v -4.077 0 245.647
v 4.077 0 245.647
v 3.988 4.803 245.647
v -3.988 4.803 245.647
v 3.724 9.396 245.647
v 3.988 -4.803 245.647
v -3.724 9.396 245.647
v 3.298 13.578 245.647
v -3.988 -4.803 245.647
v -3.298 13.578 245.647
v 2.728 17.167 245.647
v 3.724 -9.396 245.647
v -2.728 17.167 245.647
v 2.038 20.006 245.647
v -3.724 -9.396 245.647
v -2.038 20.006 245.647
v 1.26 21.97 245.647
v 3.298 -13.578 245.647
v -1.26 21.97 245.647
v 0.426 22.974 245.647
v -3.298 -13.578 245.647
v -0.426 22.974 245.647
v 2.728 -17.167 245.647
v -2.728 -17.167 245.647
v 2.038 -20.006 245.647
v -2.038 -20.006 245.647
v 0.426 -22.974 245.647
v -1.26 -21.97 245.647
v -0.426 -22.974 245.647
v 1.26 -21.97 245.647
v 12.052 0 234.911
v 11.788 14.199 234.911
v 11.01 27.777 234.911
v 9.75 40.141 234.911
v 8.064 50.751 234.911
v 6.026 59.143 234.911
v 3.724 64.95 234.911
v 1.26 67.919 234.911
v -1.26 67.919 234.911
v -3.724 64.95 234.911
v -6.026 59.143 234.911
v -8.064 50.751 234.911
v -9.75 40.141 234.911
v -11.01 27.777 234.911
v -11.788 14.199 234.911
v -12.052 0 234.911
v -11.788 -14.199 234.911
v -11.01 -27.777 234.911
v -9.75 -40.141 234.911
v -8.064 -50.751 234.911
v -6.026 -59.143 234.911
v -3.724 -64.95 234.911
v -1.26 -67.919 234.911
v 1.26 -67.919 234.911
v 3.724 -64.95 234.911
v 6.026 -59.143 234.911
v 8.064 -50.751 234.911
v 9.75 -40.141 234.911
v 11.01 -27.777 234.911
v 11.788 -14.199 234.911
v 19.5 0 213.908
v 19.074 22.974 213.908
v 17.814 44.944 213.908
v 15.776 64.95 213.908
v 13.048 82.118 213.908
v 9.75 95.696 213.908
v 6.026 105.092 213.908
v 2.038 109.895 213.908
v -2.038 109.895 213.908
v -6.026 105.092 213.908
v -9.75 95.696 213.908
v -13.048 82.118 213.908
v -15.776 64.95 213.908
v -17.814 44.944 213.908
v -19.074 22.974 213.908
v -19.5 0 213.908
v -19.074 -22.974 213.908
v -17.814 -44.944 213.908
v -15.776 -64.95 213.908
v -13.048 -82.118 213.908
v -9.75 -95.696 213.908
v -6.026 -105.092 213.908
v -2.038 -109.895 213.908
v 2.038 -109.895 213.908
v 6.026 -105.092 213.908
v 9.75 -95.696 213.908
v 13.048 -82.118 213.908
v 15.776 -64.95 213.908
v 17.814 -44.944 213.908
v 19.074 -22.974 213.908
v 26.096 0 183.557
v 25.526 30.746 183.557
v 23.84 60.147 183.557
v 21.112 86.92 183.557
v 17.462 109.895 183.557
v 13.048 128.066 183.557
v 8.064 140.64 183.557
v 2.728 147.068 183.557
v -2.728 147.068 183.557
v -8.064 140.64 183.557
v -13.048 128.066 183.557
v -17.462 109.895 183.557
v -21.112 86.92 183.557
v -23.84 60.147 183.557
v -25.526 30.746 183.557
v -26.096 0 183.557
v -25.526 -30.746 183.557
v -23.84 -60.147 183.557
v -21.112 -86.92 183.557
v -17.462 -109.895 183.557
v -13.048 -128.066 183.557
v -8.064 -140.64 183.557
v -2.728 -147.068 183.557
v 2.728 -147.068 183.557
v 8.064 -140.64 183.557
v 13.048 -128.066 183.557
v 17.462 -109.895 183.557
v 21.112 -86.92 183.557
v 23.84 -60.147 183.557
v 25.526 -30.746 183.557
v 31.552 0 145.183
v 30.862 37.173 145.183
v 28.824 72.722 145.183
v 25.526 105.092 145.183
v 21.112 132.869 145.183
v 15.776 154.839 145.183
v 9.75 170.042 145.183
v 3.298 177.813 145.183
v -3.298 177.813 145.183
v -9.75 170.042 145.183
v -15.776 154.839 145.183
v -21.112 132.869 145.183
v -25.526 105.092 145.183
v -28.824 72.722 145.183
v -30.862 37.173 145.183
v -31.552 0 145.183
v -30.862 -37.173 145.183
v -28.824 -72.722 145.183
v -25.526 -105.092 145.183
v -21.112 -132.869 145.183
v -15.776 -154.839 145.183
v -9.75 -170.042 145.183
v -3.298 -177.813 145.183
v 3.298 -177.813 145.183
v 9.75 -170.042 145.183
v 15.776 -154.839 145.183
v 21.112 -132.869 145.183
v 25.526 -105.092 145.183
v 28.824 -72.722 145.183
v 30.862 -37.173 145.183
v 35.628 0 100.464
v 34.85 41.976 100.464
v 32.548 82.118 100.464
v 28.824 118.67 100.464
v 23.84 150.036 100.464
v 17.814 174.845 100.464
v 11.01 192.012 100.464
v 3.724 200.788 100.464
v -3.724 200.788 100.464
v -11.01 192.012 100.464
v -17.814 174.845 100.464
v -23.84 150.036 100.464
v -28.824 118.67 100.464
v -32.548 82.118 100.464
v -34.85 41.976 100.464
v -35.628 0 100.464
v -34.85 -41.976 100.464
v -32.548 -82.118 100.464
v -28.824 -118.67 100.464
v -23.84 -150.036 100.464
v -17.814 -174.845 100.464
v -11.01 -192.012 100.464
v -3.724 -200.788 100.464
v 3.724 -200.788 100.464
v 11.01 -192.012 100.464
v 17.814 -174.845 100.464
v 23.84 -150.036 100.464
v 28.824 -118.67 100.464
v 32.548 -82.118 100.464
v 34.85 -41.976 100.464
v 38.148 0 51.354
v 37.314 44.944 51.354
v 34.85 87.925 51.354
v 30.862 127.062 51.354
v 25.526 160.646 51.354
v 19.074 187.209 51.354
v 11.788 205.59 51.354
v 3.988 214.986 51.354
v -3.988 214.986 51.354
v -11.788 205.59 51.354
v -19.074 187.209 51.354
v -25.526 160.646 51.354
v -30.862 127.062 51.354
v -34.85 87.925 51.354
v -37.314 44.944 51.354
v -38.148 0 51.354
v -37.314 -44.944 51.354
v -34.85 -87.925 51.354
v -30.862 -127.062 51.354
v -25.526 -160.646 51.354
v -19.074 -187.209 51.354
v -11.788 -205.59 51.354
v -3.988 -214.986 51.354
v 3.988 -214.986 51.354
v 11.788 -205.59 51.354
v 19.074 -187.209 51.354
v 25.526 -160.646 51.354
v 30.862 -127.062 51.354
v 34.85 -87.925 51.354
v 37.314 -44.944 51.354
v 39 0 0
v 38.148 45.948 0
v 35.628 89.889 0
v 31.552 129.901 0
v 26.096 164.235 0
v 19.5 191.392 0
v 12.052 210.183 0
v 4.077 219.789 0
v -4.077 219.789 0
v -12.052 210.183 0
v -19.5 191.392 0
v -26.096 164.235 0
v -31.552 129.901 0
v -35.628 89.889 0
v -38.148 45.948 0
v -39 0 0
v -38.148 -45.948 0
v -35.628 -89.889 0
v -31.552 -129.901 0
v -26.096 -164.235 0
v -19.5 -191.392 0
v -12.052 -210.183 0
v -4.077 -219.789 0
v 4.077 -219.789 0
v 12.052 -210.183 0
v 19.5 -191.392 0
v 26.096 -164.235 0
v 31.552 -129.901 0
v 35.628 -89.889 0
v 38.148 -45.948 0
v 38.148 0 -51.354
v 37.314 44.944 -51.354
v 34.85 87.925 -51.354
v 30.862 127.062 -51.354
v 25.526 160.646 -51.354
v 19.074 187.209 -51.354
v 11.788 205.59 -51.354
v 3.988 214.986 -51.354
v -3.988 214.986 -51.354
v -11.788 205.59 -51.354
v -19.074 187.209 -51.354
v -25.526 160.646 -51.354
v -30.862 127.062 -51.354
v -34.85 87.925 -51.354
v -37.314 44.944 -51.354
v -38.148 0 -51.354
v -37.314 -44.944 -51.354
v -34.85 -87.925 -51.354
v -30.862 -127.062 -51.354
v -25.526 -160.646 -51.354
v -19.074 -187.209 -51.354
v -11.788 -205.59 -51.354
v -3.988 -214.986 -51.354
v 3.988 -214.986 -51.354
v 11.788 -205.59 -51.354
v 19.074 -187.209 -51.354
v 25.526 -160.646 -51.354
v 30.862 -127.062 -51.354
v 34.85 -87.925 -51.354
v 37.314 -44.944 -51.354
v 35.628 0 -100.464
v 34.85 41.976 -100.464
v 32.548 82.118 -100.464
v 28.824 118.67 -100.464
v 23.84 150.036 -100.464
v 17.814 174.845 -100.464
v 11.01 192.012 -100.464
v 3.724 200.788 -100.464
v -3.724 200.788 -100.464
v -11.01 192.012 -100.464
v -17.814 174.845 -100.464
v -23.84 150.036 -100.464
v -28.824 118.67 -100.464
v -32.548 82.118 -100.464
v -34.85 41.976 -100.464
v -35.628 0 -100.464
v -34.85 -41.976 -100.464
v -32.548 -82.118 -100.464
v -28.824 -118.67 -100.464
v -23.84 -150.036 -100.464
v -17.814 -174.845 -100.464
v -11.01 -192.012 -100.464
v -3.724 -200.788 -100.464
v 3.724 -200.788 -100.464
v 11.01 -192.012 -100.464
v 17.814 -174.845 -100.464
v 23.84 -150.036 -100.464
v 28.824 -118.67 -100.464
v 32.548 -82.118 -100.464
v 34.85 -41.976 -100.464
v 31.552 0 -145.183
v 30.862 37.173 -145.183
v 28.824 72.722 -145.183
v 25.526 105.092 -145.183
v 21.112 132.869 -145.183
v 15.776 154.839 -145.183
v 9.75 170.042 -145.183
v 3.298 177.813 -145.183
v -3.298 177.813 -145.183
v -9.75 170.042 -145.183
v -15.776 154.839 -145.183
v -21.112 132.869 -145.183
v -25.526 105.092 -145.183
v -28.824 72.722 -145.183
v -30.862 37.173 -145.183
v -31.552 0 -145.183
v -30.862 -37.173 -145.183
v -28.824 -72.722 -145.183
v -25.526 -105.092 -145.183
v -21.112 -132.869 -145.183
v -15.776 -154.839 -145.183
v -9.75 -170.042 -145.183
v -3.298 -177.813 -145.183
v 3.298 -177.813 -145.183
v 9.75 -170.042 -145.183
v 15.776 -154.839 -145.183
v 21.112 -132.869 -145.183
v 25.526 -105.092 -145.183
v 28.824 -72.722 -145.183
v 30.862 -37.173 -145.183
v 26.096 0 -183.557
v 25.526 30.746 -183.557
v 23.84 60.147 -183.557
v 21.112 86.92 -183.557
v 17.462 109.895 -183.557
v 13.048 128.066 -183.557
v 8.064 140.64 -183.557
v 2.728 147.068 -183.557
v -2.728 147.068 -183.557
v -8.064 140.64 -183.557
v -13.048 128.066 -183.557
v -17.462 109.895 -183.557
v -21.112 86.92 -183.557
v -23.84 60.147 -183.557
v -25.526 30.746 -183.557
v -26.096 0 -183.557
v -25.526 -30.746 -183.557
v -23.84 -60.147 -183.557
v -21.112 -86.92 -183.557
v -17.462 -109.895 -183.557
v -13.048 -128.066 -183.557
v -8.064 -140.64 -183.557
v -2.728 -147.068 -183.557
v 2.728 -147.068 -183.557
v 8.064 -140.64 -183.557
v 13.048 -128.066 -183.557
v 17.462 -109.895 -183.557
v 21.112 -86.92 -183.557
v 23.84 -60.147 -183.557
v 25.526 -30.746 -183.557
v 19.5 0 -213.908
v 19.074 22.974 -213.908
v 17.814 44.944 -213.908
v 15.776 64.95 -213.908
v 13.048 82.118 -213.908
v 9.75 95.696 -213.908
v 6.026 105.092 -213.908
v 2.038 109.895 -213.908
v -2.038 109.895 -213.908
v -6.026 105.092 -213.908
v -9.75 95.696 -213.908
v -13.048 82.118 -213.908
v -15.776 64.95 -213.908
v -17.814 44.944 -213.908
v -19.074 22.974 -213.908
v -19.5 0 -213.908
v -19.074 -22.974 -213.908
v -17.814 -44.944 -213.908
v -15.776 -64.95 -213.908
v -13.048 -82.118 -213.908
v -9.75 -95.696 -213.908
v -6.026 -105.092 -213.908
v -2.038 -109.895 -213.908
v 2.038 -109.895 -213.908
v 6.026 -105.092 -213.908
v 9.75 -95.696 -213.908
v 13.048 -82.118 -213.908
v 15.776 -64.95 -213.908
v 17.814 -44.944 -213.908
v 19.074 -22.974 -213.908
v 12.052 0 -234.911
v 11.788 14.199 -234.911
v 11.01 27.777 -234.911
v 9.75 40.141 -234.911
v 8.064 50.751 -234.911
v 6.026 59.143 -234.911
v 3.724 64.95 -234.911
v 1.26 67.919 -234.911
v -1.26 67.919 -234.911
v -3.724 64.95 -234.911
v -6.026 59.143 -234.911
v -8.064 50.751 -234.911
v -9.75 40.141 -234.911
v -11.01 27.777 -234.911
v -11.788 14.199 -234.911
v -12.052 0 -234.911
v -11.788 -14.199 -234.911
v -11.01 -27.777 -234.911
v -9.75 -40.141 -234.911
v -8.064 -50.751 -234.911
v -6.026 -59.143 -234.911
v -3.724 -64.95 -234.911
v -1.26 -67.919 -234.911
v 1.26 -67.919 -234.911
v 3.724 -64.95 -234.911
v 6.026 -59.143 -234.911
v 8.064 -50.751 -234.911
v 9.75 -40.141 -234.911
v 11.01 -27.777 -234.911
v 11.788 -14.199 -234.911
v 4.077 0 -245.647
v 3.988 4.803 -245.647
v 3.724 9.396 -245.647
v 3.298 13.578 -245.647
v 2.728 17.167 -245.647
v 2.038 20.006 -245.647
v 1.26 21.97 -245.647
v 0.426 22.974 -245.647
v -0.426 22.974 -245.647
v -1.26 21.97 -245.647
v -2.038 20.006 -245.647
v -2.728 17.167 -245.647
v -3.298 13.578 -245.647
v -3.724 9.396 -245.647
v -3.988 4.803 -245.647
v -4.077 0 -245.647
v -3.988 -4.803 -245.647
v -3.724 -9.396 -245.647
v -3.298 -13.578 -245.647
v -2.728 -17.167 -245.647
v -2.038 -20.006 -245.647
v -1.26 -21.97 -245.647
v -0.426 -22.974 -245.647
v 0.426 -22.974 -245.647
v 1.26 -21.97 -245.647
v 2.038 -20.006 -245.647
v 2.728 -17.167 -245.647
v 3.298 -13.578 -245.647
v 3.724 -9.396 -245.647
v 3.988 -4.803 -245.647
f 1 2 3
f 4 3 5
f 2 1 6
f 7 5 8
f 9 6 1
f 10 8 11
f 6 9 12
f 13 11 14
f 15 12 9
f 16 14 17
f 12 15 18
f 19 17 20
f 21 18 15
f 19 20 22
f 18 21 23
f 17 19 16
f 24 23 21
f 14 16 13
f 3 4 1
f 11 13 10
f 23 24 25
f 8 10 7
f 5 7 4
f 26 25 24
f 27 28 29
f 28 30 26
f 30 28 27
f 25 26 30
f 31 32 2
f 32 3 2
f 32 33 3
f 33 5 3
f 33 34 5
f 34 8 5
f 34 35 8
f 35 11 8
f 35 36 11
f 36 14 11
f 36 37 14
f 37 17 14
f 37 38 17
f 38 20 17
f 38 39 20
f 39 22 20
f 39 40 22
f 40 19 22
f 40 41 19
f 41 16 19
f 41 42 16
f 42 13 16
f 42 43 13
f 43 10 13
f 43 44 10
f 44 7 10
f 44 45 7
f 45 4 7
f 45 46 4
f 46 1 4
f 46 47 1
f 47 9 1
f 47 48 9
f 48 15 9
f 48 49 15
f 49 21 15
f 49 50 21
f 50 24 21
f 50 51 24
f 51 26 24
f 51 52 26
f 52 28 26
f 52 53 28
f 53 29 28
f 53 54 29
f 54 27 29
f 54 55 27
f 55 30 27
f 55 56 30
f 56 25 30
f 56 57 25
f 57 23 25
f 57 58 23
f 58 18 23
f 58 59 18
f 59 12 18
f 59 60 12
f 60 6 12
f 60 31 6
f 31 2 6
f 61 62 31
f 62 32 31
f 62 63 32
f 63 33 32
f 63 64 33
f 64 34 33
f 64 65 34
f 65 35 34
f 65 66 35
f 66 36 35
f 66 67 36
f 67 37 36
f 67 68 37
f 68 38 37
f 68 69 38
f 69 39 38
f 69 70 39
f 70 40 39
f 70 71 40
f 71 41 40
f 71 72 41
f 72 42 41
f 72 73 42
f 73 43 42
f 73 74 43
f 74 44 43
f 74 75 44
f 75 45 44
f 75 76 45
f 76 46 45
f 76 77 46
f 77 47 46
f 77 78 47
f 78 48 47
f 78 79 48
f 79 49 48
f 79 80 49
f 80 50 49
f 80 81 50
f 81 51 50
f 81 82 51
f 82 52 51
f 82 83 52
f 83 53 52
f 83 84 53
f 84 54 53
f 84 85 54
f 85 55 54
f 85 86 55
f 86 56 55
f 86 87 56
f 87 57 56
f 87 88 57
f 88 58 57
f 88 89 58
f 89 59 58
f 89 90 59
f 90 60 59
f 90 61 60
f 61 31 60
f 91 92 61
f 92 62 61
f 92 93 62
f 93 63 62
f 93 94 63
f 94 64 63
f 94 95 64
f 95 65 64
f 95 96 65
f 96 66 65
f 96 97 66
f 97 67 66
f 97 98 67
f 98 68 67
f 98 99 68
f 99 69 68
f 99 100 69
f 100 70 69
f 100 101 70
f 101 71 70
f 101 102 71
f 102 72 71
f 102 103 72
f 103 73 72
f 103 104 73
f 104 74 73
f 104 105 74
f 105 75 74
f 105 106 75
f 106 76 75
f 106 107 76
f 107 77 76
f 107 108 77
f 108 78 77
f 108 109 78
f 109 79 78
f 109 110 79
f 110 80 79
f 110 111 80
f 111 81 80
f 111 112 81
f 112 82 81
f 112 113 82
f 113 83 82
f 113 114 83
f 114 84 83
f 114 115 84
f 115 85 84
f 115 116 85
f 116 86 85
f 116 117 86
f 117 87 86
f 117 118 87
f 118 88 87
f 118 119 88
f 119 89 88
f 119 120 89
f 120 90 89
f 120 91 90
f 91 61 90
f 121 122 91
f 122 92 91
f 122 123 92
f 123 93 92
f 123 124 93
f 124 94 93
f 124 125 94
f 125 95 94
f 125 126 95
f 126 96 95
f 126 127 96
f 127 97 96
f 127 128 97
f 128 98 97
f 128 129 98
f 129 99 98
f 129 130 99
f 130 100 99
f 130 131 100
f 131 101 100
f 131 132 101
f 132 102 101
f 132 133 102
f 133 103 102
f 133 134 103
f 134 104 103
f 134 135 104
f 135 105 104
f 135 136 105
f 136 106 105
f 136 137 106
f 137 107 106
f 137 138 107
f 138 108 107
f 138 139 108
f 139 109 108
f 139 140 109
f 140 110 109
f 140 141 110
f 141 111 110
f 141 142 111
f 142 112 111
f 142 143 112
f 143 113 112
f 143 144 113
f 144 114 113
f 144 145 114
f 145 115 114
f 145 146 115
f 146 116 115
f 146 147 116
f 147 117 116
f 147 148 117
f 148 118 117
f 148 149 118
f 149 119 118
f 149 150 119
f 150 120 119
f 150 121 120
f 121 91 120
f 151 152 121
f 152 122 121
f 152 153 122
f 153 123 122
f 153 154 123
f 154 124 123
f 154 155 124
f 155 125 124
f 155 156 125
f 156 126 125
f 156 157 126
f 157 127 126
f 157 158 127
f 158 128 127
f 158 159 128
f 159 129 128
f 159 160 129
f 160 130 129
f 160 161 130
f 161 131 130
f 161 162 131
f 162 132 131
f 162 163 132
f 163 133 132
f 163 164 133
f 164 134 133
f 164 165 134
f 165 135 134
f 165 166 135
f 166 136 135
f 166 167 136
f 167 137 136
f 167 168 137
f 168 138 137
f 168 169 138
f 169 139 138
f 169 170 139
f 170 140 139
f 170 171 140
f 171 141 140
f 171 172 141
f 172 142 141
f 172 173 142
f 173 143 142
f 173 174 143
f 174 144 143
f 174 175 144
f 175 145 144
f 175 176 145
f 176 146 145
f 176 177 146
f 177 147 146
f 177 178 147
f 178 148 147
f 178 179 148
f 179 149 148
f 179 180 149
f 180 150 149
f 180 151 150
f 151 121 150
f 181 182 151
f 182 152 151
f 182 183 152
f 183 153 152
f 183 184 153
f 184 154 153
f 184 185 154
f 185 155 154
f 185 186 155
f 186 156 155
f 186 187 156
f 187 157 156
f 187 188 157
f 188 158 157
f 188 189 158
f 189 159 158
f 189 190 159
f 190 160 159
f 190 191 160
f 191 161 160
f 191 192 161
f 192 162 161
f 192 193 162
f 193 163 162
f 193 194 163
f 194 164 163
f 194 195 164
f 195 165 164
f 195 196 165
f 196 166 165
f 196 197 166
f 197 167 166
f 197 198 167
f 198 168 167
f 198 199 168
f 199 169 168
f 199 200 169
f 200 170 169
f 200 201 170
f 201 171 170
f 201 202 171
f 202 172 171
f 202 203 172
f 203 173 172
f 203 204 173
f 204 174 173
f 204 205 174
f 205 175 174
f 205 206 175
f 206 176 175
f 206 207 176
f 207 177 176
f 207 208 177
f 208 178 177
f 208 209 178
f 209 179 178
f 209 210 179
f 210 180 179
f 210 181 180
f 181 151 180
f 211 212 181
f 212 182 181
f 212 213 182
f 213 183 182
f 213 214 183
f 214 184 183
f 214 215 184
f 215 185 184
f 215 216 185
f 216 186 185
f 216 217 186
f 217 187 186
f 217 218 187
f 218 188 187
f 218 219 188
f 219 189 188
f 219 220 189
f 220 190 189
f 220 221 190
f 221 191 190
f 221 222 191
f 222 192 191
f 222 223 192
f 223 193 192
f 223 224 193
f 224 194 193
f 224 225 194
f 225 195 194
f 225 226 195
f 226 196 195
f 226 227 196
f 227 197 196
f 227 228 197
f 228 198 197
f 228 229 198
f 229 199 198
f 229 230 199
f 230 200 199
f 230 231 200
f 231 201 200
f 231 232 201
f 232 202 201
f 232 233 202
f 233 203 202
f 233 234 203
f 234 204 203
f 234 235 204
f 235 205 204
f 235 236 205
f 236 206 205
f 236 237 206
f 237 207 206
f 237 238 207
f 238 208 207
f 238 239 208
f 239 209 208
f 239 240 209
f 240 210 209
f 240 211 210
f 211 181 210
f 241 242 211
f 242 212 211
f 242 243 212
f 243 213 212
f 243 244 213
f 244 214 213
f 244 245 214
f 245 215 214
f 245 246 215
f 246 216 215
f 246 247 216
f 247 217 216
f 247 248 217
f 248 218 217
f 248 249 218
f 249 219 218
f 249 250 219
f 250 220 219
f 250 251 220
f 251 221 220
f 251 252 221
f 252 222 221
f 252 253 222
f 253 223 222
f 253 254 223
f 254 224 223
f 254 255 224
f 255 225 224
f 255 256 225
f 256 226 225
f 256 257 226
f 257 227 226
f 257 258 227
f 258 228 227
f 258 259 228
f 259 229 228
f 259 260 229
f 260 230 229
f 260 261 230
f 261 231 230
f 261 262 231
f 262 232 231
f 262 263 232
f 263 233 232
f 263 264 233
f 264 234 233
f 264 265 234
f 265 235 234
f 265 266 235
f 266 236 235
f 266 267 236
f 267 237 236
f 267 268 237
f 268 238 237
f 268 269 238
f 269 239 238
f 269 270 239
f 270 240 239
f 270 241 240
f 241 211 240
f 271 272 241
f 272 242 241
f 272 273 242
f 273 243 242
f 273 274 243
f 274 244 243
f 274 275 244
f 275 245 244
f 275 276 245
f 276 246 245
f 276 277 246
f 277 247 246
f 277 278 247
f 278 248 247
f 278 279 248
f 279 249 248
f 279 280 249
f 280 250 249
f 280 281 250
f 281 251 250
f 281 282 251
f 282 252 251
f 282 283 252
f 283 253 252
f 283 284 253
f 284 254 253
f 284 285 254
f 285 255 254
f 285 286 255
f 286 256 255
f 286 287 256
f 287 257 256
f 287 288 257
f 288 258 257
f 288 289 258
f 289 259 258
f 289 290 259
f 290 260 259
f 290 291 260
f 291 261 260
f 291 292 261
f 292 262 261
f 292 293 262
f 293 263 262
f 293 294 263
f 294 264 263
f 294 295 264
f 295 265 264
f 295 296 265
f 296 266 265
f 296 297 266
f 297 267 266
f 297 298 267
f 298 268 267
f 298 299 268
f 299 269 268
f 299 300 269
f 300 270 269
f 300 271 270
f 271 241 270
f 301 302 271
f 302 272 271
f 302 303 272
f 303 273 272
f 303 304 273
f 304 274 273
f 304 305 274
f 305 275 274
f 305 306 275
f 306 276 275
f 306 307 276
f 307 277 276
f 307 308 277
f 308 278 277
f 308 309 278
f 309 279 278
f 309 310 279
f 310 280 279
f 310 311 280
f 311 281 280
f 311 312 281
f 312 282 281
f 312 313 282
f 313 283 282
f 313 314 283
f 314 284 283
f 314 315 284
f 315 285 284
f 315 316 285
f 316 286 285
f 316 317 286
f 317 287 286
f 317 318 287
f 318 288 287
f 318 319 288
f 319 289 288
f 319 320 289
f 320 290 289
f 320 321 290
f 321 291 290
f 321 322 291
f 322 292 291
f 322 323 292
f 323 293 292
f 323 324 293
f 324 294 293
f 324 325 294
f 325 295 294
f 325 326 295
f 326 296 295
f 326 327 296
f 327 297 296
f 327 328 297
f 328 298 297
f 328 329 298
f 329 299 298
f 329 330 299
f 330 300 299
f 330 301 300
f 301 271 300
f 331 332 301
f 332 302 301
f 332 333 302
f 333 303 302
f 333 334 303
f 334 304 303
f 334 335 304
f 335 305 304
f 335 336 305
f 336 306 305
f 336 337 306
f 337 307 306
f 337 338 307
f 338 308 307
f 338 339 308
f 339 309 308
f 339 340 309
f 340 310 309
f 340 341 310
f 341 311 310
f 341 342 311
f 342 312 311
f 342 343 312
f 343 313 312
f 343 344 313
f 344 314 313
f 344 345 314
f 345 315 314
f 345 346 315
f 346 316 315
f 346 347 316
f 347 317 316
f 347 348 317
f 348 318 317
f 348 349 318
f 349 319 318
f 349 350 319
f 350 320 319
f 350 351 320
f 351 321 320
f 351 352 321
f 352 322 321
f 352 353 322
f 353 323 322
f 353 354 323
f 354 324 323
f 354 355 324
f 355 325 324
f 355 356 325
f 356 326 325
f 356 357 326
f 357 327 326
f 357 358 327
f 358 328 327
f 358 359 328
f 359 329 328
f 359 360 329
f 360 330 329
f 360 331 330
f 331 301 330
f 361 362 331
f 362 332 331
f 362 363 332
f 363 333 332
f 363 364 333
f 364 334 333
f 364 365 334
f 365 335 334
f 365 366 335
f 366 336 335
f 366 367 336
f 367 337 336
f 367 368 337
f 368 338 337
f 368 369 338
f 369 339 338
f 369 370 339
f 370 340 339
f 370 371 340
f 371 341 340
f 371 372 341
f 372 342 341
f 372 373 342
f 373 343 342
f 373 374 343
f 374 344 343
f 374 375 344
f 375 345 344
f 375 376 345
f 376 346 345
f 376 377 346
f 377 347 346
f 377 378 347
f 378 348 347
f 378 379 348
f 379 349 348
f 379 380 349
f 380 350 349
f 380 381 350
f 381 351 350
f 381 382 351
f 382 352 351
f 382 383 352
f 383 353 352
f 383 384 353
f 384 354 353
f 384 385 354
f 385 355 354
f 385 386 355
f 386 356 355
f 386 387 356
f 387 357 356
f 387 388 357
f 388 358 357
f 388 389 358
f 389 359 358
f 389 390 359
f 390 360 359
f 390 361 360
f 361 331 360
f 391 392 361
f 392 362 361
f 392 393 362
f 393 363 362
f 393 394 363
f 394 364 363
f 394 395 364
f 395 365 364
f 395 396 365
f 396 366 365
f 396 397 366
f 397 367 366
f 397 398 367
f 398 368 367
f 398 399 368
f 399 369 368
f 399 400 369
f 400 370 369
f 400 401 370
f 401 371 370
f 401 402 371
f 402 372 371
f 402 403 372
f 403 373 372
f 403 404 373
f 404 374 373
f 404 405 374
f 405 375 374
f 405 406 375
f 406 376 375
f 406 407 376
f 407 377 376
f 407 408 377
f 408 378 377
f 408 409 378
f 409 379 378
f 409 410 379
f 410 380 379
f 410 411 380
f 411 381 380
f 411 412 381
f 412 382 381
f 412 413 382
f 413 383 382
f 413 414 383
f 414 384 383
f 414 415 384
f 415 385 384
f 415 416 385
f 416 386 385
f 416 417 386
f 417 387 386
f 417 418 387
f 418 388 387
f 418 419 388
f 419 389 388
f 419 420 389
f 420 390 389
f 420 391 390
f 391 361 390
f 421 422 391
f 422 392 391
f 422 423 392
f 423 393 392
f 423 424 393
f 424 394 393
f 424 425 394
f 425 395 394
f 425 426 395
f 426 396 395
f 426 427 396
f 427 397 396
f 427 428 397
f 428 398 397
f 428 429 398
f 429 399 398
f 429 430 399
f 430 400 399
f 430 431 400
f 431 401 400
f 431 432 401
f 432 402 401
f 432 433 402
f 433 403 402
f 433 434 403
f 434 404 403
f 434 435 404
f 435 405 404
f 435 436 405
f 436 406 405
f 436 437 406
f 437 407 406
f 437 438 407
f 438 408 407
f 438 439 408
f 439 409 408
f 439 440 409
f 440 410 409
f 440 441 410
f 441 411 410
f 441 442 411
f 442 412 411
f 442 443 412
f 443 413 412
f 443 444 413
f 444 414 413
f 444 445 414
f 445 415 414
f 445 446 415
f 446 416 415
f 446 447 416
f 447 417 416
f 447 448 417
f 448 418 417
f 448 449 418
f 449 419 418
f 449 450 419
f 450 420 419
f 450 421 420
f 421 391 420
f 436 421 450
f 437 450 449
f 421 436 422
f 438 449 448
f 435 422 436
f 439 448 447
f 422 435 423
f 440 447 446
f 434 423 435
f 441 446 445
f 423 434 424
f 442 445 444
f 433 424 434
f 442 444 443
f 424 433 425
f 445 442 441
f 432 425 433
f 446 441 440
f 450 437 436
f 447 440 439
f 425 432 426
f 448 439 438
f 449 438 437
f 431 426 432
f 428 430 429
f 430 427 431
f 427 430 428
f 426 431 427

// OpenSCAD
// Generated by SolidPython 1.0.1 on 2020-07-29 00:46:46


scale(v = [3, 17, 19]) {
	sphere(r = 13);
}
/***********************************************
*********      SolidPython code:      **********
************************************************
 
# import packages: SolidPython
from solid import *
from solid.utils import *
from itertools import chain, combinations, permutations


class Resize:

    def __init__(self, scad_file):
        self.scad_file = scad_file
        #self.scad_file = import_scad(scad_file)
        # cone/cylinder param:
        self.r1 = 0
        self.r2 = 0
        self.h = 0
        # rectangular prism param:
        self.w = 0
        self.l = 0
        # ellipse param:
        self.r = 0

    # import OpenScad code (file name corresponds to shape)


    # classify shape + parameters
    def assign(self, param1, param2, param3):
        if self.scad_file == 'cone.scad':
            self.r1 = param1
            self.r2 = param2
            self.h = param3
        elif self.scad_file == 'cylinder.scad':
            self.r1 = param1
            self.r2 = param2
            self.h = param3
        elif self.scad_file == 'rectangularPrism.scad':
            self.h = param1
            self.l = param2
            self.w = param3
        else:
            self.r = param1
            self.h = param2

    # resize parameters
    def iterate(self):
        x = range(3, 20, 2)
        i = 1
        if self.scad_file == 'cone.scad':
            tempList = list(permutations(x, 2))
            for temp in tempList:
                param1 = temp[0]
                param2 = temp[1]
                filepath = 'produced_scad_files/' + 'cone' + str(param1) + '_' + str(param2) + '_' + '.scad'
                scad_render_to_file(cylinder(h=param1, r1=param2, r2=0), filepath)

        elif self.scad_file == 'cylinder.scad':
            tempList = list(permutations(x, 3))
            for temp in tempList:
                param1 = temp[0]
                param2 = temp[1]
                filepath = 'produced_scad_files/' + 'cylinder' + str(param1) + '_' + str(param2) + '_' + '.scad'
                scad_render_to_file(cylinder(h=param1, r1=param2, r2=param2), filepath)

        elif self.scad_file == 'rectangularPrism.scad':
            tempList = list(permutations(x, 3))
            for temp in tempList:
                param1 = temp[0]
                param2 = temp[1]
                param3 = temp[2]
                filepath = 'produced_scad_files/' + 'rectangularPrism' + str(param1) + '_' + str(param2) + '_' + str(
                    param3) + '.scad'
                scad_render_to_file(cube(size=(param1, param2, param3)), filepath)

        elif self.scad_file == 'ellipse.scad':
            tempList = list(permutations(x, 4))
            for temp in tempList:
                param1 = temp[0]
                param2 = temp[1]
                param3 = temp[2]
                param4 = temp[3]
                filepath = 'produced_scad_files/' + 'ellipse' + str(param1) + '_' + str(param2) + '_' + str(param3) + '_' + str(param4) + '.scad'
                scad_render_to_file(scale([param1, param2, param3])(sphere(r=param4)), filepath)

    def render_to_scadfile(self):
        scad_render_to_file(scad, 'example.scad') 
 
************************************************/
